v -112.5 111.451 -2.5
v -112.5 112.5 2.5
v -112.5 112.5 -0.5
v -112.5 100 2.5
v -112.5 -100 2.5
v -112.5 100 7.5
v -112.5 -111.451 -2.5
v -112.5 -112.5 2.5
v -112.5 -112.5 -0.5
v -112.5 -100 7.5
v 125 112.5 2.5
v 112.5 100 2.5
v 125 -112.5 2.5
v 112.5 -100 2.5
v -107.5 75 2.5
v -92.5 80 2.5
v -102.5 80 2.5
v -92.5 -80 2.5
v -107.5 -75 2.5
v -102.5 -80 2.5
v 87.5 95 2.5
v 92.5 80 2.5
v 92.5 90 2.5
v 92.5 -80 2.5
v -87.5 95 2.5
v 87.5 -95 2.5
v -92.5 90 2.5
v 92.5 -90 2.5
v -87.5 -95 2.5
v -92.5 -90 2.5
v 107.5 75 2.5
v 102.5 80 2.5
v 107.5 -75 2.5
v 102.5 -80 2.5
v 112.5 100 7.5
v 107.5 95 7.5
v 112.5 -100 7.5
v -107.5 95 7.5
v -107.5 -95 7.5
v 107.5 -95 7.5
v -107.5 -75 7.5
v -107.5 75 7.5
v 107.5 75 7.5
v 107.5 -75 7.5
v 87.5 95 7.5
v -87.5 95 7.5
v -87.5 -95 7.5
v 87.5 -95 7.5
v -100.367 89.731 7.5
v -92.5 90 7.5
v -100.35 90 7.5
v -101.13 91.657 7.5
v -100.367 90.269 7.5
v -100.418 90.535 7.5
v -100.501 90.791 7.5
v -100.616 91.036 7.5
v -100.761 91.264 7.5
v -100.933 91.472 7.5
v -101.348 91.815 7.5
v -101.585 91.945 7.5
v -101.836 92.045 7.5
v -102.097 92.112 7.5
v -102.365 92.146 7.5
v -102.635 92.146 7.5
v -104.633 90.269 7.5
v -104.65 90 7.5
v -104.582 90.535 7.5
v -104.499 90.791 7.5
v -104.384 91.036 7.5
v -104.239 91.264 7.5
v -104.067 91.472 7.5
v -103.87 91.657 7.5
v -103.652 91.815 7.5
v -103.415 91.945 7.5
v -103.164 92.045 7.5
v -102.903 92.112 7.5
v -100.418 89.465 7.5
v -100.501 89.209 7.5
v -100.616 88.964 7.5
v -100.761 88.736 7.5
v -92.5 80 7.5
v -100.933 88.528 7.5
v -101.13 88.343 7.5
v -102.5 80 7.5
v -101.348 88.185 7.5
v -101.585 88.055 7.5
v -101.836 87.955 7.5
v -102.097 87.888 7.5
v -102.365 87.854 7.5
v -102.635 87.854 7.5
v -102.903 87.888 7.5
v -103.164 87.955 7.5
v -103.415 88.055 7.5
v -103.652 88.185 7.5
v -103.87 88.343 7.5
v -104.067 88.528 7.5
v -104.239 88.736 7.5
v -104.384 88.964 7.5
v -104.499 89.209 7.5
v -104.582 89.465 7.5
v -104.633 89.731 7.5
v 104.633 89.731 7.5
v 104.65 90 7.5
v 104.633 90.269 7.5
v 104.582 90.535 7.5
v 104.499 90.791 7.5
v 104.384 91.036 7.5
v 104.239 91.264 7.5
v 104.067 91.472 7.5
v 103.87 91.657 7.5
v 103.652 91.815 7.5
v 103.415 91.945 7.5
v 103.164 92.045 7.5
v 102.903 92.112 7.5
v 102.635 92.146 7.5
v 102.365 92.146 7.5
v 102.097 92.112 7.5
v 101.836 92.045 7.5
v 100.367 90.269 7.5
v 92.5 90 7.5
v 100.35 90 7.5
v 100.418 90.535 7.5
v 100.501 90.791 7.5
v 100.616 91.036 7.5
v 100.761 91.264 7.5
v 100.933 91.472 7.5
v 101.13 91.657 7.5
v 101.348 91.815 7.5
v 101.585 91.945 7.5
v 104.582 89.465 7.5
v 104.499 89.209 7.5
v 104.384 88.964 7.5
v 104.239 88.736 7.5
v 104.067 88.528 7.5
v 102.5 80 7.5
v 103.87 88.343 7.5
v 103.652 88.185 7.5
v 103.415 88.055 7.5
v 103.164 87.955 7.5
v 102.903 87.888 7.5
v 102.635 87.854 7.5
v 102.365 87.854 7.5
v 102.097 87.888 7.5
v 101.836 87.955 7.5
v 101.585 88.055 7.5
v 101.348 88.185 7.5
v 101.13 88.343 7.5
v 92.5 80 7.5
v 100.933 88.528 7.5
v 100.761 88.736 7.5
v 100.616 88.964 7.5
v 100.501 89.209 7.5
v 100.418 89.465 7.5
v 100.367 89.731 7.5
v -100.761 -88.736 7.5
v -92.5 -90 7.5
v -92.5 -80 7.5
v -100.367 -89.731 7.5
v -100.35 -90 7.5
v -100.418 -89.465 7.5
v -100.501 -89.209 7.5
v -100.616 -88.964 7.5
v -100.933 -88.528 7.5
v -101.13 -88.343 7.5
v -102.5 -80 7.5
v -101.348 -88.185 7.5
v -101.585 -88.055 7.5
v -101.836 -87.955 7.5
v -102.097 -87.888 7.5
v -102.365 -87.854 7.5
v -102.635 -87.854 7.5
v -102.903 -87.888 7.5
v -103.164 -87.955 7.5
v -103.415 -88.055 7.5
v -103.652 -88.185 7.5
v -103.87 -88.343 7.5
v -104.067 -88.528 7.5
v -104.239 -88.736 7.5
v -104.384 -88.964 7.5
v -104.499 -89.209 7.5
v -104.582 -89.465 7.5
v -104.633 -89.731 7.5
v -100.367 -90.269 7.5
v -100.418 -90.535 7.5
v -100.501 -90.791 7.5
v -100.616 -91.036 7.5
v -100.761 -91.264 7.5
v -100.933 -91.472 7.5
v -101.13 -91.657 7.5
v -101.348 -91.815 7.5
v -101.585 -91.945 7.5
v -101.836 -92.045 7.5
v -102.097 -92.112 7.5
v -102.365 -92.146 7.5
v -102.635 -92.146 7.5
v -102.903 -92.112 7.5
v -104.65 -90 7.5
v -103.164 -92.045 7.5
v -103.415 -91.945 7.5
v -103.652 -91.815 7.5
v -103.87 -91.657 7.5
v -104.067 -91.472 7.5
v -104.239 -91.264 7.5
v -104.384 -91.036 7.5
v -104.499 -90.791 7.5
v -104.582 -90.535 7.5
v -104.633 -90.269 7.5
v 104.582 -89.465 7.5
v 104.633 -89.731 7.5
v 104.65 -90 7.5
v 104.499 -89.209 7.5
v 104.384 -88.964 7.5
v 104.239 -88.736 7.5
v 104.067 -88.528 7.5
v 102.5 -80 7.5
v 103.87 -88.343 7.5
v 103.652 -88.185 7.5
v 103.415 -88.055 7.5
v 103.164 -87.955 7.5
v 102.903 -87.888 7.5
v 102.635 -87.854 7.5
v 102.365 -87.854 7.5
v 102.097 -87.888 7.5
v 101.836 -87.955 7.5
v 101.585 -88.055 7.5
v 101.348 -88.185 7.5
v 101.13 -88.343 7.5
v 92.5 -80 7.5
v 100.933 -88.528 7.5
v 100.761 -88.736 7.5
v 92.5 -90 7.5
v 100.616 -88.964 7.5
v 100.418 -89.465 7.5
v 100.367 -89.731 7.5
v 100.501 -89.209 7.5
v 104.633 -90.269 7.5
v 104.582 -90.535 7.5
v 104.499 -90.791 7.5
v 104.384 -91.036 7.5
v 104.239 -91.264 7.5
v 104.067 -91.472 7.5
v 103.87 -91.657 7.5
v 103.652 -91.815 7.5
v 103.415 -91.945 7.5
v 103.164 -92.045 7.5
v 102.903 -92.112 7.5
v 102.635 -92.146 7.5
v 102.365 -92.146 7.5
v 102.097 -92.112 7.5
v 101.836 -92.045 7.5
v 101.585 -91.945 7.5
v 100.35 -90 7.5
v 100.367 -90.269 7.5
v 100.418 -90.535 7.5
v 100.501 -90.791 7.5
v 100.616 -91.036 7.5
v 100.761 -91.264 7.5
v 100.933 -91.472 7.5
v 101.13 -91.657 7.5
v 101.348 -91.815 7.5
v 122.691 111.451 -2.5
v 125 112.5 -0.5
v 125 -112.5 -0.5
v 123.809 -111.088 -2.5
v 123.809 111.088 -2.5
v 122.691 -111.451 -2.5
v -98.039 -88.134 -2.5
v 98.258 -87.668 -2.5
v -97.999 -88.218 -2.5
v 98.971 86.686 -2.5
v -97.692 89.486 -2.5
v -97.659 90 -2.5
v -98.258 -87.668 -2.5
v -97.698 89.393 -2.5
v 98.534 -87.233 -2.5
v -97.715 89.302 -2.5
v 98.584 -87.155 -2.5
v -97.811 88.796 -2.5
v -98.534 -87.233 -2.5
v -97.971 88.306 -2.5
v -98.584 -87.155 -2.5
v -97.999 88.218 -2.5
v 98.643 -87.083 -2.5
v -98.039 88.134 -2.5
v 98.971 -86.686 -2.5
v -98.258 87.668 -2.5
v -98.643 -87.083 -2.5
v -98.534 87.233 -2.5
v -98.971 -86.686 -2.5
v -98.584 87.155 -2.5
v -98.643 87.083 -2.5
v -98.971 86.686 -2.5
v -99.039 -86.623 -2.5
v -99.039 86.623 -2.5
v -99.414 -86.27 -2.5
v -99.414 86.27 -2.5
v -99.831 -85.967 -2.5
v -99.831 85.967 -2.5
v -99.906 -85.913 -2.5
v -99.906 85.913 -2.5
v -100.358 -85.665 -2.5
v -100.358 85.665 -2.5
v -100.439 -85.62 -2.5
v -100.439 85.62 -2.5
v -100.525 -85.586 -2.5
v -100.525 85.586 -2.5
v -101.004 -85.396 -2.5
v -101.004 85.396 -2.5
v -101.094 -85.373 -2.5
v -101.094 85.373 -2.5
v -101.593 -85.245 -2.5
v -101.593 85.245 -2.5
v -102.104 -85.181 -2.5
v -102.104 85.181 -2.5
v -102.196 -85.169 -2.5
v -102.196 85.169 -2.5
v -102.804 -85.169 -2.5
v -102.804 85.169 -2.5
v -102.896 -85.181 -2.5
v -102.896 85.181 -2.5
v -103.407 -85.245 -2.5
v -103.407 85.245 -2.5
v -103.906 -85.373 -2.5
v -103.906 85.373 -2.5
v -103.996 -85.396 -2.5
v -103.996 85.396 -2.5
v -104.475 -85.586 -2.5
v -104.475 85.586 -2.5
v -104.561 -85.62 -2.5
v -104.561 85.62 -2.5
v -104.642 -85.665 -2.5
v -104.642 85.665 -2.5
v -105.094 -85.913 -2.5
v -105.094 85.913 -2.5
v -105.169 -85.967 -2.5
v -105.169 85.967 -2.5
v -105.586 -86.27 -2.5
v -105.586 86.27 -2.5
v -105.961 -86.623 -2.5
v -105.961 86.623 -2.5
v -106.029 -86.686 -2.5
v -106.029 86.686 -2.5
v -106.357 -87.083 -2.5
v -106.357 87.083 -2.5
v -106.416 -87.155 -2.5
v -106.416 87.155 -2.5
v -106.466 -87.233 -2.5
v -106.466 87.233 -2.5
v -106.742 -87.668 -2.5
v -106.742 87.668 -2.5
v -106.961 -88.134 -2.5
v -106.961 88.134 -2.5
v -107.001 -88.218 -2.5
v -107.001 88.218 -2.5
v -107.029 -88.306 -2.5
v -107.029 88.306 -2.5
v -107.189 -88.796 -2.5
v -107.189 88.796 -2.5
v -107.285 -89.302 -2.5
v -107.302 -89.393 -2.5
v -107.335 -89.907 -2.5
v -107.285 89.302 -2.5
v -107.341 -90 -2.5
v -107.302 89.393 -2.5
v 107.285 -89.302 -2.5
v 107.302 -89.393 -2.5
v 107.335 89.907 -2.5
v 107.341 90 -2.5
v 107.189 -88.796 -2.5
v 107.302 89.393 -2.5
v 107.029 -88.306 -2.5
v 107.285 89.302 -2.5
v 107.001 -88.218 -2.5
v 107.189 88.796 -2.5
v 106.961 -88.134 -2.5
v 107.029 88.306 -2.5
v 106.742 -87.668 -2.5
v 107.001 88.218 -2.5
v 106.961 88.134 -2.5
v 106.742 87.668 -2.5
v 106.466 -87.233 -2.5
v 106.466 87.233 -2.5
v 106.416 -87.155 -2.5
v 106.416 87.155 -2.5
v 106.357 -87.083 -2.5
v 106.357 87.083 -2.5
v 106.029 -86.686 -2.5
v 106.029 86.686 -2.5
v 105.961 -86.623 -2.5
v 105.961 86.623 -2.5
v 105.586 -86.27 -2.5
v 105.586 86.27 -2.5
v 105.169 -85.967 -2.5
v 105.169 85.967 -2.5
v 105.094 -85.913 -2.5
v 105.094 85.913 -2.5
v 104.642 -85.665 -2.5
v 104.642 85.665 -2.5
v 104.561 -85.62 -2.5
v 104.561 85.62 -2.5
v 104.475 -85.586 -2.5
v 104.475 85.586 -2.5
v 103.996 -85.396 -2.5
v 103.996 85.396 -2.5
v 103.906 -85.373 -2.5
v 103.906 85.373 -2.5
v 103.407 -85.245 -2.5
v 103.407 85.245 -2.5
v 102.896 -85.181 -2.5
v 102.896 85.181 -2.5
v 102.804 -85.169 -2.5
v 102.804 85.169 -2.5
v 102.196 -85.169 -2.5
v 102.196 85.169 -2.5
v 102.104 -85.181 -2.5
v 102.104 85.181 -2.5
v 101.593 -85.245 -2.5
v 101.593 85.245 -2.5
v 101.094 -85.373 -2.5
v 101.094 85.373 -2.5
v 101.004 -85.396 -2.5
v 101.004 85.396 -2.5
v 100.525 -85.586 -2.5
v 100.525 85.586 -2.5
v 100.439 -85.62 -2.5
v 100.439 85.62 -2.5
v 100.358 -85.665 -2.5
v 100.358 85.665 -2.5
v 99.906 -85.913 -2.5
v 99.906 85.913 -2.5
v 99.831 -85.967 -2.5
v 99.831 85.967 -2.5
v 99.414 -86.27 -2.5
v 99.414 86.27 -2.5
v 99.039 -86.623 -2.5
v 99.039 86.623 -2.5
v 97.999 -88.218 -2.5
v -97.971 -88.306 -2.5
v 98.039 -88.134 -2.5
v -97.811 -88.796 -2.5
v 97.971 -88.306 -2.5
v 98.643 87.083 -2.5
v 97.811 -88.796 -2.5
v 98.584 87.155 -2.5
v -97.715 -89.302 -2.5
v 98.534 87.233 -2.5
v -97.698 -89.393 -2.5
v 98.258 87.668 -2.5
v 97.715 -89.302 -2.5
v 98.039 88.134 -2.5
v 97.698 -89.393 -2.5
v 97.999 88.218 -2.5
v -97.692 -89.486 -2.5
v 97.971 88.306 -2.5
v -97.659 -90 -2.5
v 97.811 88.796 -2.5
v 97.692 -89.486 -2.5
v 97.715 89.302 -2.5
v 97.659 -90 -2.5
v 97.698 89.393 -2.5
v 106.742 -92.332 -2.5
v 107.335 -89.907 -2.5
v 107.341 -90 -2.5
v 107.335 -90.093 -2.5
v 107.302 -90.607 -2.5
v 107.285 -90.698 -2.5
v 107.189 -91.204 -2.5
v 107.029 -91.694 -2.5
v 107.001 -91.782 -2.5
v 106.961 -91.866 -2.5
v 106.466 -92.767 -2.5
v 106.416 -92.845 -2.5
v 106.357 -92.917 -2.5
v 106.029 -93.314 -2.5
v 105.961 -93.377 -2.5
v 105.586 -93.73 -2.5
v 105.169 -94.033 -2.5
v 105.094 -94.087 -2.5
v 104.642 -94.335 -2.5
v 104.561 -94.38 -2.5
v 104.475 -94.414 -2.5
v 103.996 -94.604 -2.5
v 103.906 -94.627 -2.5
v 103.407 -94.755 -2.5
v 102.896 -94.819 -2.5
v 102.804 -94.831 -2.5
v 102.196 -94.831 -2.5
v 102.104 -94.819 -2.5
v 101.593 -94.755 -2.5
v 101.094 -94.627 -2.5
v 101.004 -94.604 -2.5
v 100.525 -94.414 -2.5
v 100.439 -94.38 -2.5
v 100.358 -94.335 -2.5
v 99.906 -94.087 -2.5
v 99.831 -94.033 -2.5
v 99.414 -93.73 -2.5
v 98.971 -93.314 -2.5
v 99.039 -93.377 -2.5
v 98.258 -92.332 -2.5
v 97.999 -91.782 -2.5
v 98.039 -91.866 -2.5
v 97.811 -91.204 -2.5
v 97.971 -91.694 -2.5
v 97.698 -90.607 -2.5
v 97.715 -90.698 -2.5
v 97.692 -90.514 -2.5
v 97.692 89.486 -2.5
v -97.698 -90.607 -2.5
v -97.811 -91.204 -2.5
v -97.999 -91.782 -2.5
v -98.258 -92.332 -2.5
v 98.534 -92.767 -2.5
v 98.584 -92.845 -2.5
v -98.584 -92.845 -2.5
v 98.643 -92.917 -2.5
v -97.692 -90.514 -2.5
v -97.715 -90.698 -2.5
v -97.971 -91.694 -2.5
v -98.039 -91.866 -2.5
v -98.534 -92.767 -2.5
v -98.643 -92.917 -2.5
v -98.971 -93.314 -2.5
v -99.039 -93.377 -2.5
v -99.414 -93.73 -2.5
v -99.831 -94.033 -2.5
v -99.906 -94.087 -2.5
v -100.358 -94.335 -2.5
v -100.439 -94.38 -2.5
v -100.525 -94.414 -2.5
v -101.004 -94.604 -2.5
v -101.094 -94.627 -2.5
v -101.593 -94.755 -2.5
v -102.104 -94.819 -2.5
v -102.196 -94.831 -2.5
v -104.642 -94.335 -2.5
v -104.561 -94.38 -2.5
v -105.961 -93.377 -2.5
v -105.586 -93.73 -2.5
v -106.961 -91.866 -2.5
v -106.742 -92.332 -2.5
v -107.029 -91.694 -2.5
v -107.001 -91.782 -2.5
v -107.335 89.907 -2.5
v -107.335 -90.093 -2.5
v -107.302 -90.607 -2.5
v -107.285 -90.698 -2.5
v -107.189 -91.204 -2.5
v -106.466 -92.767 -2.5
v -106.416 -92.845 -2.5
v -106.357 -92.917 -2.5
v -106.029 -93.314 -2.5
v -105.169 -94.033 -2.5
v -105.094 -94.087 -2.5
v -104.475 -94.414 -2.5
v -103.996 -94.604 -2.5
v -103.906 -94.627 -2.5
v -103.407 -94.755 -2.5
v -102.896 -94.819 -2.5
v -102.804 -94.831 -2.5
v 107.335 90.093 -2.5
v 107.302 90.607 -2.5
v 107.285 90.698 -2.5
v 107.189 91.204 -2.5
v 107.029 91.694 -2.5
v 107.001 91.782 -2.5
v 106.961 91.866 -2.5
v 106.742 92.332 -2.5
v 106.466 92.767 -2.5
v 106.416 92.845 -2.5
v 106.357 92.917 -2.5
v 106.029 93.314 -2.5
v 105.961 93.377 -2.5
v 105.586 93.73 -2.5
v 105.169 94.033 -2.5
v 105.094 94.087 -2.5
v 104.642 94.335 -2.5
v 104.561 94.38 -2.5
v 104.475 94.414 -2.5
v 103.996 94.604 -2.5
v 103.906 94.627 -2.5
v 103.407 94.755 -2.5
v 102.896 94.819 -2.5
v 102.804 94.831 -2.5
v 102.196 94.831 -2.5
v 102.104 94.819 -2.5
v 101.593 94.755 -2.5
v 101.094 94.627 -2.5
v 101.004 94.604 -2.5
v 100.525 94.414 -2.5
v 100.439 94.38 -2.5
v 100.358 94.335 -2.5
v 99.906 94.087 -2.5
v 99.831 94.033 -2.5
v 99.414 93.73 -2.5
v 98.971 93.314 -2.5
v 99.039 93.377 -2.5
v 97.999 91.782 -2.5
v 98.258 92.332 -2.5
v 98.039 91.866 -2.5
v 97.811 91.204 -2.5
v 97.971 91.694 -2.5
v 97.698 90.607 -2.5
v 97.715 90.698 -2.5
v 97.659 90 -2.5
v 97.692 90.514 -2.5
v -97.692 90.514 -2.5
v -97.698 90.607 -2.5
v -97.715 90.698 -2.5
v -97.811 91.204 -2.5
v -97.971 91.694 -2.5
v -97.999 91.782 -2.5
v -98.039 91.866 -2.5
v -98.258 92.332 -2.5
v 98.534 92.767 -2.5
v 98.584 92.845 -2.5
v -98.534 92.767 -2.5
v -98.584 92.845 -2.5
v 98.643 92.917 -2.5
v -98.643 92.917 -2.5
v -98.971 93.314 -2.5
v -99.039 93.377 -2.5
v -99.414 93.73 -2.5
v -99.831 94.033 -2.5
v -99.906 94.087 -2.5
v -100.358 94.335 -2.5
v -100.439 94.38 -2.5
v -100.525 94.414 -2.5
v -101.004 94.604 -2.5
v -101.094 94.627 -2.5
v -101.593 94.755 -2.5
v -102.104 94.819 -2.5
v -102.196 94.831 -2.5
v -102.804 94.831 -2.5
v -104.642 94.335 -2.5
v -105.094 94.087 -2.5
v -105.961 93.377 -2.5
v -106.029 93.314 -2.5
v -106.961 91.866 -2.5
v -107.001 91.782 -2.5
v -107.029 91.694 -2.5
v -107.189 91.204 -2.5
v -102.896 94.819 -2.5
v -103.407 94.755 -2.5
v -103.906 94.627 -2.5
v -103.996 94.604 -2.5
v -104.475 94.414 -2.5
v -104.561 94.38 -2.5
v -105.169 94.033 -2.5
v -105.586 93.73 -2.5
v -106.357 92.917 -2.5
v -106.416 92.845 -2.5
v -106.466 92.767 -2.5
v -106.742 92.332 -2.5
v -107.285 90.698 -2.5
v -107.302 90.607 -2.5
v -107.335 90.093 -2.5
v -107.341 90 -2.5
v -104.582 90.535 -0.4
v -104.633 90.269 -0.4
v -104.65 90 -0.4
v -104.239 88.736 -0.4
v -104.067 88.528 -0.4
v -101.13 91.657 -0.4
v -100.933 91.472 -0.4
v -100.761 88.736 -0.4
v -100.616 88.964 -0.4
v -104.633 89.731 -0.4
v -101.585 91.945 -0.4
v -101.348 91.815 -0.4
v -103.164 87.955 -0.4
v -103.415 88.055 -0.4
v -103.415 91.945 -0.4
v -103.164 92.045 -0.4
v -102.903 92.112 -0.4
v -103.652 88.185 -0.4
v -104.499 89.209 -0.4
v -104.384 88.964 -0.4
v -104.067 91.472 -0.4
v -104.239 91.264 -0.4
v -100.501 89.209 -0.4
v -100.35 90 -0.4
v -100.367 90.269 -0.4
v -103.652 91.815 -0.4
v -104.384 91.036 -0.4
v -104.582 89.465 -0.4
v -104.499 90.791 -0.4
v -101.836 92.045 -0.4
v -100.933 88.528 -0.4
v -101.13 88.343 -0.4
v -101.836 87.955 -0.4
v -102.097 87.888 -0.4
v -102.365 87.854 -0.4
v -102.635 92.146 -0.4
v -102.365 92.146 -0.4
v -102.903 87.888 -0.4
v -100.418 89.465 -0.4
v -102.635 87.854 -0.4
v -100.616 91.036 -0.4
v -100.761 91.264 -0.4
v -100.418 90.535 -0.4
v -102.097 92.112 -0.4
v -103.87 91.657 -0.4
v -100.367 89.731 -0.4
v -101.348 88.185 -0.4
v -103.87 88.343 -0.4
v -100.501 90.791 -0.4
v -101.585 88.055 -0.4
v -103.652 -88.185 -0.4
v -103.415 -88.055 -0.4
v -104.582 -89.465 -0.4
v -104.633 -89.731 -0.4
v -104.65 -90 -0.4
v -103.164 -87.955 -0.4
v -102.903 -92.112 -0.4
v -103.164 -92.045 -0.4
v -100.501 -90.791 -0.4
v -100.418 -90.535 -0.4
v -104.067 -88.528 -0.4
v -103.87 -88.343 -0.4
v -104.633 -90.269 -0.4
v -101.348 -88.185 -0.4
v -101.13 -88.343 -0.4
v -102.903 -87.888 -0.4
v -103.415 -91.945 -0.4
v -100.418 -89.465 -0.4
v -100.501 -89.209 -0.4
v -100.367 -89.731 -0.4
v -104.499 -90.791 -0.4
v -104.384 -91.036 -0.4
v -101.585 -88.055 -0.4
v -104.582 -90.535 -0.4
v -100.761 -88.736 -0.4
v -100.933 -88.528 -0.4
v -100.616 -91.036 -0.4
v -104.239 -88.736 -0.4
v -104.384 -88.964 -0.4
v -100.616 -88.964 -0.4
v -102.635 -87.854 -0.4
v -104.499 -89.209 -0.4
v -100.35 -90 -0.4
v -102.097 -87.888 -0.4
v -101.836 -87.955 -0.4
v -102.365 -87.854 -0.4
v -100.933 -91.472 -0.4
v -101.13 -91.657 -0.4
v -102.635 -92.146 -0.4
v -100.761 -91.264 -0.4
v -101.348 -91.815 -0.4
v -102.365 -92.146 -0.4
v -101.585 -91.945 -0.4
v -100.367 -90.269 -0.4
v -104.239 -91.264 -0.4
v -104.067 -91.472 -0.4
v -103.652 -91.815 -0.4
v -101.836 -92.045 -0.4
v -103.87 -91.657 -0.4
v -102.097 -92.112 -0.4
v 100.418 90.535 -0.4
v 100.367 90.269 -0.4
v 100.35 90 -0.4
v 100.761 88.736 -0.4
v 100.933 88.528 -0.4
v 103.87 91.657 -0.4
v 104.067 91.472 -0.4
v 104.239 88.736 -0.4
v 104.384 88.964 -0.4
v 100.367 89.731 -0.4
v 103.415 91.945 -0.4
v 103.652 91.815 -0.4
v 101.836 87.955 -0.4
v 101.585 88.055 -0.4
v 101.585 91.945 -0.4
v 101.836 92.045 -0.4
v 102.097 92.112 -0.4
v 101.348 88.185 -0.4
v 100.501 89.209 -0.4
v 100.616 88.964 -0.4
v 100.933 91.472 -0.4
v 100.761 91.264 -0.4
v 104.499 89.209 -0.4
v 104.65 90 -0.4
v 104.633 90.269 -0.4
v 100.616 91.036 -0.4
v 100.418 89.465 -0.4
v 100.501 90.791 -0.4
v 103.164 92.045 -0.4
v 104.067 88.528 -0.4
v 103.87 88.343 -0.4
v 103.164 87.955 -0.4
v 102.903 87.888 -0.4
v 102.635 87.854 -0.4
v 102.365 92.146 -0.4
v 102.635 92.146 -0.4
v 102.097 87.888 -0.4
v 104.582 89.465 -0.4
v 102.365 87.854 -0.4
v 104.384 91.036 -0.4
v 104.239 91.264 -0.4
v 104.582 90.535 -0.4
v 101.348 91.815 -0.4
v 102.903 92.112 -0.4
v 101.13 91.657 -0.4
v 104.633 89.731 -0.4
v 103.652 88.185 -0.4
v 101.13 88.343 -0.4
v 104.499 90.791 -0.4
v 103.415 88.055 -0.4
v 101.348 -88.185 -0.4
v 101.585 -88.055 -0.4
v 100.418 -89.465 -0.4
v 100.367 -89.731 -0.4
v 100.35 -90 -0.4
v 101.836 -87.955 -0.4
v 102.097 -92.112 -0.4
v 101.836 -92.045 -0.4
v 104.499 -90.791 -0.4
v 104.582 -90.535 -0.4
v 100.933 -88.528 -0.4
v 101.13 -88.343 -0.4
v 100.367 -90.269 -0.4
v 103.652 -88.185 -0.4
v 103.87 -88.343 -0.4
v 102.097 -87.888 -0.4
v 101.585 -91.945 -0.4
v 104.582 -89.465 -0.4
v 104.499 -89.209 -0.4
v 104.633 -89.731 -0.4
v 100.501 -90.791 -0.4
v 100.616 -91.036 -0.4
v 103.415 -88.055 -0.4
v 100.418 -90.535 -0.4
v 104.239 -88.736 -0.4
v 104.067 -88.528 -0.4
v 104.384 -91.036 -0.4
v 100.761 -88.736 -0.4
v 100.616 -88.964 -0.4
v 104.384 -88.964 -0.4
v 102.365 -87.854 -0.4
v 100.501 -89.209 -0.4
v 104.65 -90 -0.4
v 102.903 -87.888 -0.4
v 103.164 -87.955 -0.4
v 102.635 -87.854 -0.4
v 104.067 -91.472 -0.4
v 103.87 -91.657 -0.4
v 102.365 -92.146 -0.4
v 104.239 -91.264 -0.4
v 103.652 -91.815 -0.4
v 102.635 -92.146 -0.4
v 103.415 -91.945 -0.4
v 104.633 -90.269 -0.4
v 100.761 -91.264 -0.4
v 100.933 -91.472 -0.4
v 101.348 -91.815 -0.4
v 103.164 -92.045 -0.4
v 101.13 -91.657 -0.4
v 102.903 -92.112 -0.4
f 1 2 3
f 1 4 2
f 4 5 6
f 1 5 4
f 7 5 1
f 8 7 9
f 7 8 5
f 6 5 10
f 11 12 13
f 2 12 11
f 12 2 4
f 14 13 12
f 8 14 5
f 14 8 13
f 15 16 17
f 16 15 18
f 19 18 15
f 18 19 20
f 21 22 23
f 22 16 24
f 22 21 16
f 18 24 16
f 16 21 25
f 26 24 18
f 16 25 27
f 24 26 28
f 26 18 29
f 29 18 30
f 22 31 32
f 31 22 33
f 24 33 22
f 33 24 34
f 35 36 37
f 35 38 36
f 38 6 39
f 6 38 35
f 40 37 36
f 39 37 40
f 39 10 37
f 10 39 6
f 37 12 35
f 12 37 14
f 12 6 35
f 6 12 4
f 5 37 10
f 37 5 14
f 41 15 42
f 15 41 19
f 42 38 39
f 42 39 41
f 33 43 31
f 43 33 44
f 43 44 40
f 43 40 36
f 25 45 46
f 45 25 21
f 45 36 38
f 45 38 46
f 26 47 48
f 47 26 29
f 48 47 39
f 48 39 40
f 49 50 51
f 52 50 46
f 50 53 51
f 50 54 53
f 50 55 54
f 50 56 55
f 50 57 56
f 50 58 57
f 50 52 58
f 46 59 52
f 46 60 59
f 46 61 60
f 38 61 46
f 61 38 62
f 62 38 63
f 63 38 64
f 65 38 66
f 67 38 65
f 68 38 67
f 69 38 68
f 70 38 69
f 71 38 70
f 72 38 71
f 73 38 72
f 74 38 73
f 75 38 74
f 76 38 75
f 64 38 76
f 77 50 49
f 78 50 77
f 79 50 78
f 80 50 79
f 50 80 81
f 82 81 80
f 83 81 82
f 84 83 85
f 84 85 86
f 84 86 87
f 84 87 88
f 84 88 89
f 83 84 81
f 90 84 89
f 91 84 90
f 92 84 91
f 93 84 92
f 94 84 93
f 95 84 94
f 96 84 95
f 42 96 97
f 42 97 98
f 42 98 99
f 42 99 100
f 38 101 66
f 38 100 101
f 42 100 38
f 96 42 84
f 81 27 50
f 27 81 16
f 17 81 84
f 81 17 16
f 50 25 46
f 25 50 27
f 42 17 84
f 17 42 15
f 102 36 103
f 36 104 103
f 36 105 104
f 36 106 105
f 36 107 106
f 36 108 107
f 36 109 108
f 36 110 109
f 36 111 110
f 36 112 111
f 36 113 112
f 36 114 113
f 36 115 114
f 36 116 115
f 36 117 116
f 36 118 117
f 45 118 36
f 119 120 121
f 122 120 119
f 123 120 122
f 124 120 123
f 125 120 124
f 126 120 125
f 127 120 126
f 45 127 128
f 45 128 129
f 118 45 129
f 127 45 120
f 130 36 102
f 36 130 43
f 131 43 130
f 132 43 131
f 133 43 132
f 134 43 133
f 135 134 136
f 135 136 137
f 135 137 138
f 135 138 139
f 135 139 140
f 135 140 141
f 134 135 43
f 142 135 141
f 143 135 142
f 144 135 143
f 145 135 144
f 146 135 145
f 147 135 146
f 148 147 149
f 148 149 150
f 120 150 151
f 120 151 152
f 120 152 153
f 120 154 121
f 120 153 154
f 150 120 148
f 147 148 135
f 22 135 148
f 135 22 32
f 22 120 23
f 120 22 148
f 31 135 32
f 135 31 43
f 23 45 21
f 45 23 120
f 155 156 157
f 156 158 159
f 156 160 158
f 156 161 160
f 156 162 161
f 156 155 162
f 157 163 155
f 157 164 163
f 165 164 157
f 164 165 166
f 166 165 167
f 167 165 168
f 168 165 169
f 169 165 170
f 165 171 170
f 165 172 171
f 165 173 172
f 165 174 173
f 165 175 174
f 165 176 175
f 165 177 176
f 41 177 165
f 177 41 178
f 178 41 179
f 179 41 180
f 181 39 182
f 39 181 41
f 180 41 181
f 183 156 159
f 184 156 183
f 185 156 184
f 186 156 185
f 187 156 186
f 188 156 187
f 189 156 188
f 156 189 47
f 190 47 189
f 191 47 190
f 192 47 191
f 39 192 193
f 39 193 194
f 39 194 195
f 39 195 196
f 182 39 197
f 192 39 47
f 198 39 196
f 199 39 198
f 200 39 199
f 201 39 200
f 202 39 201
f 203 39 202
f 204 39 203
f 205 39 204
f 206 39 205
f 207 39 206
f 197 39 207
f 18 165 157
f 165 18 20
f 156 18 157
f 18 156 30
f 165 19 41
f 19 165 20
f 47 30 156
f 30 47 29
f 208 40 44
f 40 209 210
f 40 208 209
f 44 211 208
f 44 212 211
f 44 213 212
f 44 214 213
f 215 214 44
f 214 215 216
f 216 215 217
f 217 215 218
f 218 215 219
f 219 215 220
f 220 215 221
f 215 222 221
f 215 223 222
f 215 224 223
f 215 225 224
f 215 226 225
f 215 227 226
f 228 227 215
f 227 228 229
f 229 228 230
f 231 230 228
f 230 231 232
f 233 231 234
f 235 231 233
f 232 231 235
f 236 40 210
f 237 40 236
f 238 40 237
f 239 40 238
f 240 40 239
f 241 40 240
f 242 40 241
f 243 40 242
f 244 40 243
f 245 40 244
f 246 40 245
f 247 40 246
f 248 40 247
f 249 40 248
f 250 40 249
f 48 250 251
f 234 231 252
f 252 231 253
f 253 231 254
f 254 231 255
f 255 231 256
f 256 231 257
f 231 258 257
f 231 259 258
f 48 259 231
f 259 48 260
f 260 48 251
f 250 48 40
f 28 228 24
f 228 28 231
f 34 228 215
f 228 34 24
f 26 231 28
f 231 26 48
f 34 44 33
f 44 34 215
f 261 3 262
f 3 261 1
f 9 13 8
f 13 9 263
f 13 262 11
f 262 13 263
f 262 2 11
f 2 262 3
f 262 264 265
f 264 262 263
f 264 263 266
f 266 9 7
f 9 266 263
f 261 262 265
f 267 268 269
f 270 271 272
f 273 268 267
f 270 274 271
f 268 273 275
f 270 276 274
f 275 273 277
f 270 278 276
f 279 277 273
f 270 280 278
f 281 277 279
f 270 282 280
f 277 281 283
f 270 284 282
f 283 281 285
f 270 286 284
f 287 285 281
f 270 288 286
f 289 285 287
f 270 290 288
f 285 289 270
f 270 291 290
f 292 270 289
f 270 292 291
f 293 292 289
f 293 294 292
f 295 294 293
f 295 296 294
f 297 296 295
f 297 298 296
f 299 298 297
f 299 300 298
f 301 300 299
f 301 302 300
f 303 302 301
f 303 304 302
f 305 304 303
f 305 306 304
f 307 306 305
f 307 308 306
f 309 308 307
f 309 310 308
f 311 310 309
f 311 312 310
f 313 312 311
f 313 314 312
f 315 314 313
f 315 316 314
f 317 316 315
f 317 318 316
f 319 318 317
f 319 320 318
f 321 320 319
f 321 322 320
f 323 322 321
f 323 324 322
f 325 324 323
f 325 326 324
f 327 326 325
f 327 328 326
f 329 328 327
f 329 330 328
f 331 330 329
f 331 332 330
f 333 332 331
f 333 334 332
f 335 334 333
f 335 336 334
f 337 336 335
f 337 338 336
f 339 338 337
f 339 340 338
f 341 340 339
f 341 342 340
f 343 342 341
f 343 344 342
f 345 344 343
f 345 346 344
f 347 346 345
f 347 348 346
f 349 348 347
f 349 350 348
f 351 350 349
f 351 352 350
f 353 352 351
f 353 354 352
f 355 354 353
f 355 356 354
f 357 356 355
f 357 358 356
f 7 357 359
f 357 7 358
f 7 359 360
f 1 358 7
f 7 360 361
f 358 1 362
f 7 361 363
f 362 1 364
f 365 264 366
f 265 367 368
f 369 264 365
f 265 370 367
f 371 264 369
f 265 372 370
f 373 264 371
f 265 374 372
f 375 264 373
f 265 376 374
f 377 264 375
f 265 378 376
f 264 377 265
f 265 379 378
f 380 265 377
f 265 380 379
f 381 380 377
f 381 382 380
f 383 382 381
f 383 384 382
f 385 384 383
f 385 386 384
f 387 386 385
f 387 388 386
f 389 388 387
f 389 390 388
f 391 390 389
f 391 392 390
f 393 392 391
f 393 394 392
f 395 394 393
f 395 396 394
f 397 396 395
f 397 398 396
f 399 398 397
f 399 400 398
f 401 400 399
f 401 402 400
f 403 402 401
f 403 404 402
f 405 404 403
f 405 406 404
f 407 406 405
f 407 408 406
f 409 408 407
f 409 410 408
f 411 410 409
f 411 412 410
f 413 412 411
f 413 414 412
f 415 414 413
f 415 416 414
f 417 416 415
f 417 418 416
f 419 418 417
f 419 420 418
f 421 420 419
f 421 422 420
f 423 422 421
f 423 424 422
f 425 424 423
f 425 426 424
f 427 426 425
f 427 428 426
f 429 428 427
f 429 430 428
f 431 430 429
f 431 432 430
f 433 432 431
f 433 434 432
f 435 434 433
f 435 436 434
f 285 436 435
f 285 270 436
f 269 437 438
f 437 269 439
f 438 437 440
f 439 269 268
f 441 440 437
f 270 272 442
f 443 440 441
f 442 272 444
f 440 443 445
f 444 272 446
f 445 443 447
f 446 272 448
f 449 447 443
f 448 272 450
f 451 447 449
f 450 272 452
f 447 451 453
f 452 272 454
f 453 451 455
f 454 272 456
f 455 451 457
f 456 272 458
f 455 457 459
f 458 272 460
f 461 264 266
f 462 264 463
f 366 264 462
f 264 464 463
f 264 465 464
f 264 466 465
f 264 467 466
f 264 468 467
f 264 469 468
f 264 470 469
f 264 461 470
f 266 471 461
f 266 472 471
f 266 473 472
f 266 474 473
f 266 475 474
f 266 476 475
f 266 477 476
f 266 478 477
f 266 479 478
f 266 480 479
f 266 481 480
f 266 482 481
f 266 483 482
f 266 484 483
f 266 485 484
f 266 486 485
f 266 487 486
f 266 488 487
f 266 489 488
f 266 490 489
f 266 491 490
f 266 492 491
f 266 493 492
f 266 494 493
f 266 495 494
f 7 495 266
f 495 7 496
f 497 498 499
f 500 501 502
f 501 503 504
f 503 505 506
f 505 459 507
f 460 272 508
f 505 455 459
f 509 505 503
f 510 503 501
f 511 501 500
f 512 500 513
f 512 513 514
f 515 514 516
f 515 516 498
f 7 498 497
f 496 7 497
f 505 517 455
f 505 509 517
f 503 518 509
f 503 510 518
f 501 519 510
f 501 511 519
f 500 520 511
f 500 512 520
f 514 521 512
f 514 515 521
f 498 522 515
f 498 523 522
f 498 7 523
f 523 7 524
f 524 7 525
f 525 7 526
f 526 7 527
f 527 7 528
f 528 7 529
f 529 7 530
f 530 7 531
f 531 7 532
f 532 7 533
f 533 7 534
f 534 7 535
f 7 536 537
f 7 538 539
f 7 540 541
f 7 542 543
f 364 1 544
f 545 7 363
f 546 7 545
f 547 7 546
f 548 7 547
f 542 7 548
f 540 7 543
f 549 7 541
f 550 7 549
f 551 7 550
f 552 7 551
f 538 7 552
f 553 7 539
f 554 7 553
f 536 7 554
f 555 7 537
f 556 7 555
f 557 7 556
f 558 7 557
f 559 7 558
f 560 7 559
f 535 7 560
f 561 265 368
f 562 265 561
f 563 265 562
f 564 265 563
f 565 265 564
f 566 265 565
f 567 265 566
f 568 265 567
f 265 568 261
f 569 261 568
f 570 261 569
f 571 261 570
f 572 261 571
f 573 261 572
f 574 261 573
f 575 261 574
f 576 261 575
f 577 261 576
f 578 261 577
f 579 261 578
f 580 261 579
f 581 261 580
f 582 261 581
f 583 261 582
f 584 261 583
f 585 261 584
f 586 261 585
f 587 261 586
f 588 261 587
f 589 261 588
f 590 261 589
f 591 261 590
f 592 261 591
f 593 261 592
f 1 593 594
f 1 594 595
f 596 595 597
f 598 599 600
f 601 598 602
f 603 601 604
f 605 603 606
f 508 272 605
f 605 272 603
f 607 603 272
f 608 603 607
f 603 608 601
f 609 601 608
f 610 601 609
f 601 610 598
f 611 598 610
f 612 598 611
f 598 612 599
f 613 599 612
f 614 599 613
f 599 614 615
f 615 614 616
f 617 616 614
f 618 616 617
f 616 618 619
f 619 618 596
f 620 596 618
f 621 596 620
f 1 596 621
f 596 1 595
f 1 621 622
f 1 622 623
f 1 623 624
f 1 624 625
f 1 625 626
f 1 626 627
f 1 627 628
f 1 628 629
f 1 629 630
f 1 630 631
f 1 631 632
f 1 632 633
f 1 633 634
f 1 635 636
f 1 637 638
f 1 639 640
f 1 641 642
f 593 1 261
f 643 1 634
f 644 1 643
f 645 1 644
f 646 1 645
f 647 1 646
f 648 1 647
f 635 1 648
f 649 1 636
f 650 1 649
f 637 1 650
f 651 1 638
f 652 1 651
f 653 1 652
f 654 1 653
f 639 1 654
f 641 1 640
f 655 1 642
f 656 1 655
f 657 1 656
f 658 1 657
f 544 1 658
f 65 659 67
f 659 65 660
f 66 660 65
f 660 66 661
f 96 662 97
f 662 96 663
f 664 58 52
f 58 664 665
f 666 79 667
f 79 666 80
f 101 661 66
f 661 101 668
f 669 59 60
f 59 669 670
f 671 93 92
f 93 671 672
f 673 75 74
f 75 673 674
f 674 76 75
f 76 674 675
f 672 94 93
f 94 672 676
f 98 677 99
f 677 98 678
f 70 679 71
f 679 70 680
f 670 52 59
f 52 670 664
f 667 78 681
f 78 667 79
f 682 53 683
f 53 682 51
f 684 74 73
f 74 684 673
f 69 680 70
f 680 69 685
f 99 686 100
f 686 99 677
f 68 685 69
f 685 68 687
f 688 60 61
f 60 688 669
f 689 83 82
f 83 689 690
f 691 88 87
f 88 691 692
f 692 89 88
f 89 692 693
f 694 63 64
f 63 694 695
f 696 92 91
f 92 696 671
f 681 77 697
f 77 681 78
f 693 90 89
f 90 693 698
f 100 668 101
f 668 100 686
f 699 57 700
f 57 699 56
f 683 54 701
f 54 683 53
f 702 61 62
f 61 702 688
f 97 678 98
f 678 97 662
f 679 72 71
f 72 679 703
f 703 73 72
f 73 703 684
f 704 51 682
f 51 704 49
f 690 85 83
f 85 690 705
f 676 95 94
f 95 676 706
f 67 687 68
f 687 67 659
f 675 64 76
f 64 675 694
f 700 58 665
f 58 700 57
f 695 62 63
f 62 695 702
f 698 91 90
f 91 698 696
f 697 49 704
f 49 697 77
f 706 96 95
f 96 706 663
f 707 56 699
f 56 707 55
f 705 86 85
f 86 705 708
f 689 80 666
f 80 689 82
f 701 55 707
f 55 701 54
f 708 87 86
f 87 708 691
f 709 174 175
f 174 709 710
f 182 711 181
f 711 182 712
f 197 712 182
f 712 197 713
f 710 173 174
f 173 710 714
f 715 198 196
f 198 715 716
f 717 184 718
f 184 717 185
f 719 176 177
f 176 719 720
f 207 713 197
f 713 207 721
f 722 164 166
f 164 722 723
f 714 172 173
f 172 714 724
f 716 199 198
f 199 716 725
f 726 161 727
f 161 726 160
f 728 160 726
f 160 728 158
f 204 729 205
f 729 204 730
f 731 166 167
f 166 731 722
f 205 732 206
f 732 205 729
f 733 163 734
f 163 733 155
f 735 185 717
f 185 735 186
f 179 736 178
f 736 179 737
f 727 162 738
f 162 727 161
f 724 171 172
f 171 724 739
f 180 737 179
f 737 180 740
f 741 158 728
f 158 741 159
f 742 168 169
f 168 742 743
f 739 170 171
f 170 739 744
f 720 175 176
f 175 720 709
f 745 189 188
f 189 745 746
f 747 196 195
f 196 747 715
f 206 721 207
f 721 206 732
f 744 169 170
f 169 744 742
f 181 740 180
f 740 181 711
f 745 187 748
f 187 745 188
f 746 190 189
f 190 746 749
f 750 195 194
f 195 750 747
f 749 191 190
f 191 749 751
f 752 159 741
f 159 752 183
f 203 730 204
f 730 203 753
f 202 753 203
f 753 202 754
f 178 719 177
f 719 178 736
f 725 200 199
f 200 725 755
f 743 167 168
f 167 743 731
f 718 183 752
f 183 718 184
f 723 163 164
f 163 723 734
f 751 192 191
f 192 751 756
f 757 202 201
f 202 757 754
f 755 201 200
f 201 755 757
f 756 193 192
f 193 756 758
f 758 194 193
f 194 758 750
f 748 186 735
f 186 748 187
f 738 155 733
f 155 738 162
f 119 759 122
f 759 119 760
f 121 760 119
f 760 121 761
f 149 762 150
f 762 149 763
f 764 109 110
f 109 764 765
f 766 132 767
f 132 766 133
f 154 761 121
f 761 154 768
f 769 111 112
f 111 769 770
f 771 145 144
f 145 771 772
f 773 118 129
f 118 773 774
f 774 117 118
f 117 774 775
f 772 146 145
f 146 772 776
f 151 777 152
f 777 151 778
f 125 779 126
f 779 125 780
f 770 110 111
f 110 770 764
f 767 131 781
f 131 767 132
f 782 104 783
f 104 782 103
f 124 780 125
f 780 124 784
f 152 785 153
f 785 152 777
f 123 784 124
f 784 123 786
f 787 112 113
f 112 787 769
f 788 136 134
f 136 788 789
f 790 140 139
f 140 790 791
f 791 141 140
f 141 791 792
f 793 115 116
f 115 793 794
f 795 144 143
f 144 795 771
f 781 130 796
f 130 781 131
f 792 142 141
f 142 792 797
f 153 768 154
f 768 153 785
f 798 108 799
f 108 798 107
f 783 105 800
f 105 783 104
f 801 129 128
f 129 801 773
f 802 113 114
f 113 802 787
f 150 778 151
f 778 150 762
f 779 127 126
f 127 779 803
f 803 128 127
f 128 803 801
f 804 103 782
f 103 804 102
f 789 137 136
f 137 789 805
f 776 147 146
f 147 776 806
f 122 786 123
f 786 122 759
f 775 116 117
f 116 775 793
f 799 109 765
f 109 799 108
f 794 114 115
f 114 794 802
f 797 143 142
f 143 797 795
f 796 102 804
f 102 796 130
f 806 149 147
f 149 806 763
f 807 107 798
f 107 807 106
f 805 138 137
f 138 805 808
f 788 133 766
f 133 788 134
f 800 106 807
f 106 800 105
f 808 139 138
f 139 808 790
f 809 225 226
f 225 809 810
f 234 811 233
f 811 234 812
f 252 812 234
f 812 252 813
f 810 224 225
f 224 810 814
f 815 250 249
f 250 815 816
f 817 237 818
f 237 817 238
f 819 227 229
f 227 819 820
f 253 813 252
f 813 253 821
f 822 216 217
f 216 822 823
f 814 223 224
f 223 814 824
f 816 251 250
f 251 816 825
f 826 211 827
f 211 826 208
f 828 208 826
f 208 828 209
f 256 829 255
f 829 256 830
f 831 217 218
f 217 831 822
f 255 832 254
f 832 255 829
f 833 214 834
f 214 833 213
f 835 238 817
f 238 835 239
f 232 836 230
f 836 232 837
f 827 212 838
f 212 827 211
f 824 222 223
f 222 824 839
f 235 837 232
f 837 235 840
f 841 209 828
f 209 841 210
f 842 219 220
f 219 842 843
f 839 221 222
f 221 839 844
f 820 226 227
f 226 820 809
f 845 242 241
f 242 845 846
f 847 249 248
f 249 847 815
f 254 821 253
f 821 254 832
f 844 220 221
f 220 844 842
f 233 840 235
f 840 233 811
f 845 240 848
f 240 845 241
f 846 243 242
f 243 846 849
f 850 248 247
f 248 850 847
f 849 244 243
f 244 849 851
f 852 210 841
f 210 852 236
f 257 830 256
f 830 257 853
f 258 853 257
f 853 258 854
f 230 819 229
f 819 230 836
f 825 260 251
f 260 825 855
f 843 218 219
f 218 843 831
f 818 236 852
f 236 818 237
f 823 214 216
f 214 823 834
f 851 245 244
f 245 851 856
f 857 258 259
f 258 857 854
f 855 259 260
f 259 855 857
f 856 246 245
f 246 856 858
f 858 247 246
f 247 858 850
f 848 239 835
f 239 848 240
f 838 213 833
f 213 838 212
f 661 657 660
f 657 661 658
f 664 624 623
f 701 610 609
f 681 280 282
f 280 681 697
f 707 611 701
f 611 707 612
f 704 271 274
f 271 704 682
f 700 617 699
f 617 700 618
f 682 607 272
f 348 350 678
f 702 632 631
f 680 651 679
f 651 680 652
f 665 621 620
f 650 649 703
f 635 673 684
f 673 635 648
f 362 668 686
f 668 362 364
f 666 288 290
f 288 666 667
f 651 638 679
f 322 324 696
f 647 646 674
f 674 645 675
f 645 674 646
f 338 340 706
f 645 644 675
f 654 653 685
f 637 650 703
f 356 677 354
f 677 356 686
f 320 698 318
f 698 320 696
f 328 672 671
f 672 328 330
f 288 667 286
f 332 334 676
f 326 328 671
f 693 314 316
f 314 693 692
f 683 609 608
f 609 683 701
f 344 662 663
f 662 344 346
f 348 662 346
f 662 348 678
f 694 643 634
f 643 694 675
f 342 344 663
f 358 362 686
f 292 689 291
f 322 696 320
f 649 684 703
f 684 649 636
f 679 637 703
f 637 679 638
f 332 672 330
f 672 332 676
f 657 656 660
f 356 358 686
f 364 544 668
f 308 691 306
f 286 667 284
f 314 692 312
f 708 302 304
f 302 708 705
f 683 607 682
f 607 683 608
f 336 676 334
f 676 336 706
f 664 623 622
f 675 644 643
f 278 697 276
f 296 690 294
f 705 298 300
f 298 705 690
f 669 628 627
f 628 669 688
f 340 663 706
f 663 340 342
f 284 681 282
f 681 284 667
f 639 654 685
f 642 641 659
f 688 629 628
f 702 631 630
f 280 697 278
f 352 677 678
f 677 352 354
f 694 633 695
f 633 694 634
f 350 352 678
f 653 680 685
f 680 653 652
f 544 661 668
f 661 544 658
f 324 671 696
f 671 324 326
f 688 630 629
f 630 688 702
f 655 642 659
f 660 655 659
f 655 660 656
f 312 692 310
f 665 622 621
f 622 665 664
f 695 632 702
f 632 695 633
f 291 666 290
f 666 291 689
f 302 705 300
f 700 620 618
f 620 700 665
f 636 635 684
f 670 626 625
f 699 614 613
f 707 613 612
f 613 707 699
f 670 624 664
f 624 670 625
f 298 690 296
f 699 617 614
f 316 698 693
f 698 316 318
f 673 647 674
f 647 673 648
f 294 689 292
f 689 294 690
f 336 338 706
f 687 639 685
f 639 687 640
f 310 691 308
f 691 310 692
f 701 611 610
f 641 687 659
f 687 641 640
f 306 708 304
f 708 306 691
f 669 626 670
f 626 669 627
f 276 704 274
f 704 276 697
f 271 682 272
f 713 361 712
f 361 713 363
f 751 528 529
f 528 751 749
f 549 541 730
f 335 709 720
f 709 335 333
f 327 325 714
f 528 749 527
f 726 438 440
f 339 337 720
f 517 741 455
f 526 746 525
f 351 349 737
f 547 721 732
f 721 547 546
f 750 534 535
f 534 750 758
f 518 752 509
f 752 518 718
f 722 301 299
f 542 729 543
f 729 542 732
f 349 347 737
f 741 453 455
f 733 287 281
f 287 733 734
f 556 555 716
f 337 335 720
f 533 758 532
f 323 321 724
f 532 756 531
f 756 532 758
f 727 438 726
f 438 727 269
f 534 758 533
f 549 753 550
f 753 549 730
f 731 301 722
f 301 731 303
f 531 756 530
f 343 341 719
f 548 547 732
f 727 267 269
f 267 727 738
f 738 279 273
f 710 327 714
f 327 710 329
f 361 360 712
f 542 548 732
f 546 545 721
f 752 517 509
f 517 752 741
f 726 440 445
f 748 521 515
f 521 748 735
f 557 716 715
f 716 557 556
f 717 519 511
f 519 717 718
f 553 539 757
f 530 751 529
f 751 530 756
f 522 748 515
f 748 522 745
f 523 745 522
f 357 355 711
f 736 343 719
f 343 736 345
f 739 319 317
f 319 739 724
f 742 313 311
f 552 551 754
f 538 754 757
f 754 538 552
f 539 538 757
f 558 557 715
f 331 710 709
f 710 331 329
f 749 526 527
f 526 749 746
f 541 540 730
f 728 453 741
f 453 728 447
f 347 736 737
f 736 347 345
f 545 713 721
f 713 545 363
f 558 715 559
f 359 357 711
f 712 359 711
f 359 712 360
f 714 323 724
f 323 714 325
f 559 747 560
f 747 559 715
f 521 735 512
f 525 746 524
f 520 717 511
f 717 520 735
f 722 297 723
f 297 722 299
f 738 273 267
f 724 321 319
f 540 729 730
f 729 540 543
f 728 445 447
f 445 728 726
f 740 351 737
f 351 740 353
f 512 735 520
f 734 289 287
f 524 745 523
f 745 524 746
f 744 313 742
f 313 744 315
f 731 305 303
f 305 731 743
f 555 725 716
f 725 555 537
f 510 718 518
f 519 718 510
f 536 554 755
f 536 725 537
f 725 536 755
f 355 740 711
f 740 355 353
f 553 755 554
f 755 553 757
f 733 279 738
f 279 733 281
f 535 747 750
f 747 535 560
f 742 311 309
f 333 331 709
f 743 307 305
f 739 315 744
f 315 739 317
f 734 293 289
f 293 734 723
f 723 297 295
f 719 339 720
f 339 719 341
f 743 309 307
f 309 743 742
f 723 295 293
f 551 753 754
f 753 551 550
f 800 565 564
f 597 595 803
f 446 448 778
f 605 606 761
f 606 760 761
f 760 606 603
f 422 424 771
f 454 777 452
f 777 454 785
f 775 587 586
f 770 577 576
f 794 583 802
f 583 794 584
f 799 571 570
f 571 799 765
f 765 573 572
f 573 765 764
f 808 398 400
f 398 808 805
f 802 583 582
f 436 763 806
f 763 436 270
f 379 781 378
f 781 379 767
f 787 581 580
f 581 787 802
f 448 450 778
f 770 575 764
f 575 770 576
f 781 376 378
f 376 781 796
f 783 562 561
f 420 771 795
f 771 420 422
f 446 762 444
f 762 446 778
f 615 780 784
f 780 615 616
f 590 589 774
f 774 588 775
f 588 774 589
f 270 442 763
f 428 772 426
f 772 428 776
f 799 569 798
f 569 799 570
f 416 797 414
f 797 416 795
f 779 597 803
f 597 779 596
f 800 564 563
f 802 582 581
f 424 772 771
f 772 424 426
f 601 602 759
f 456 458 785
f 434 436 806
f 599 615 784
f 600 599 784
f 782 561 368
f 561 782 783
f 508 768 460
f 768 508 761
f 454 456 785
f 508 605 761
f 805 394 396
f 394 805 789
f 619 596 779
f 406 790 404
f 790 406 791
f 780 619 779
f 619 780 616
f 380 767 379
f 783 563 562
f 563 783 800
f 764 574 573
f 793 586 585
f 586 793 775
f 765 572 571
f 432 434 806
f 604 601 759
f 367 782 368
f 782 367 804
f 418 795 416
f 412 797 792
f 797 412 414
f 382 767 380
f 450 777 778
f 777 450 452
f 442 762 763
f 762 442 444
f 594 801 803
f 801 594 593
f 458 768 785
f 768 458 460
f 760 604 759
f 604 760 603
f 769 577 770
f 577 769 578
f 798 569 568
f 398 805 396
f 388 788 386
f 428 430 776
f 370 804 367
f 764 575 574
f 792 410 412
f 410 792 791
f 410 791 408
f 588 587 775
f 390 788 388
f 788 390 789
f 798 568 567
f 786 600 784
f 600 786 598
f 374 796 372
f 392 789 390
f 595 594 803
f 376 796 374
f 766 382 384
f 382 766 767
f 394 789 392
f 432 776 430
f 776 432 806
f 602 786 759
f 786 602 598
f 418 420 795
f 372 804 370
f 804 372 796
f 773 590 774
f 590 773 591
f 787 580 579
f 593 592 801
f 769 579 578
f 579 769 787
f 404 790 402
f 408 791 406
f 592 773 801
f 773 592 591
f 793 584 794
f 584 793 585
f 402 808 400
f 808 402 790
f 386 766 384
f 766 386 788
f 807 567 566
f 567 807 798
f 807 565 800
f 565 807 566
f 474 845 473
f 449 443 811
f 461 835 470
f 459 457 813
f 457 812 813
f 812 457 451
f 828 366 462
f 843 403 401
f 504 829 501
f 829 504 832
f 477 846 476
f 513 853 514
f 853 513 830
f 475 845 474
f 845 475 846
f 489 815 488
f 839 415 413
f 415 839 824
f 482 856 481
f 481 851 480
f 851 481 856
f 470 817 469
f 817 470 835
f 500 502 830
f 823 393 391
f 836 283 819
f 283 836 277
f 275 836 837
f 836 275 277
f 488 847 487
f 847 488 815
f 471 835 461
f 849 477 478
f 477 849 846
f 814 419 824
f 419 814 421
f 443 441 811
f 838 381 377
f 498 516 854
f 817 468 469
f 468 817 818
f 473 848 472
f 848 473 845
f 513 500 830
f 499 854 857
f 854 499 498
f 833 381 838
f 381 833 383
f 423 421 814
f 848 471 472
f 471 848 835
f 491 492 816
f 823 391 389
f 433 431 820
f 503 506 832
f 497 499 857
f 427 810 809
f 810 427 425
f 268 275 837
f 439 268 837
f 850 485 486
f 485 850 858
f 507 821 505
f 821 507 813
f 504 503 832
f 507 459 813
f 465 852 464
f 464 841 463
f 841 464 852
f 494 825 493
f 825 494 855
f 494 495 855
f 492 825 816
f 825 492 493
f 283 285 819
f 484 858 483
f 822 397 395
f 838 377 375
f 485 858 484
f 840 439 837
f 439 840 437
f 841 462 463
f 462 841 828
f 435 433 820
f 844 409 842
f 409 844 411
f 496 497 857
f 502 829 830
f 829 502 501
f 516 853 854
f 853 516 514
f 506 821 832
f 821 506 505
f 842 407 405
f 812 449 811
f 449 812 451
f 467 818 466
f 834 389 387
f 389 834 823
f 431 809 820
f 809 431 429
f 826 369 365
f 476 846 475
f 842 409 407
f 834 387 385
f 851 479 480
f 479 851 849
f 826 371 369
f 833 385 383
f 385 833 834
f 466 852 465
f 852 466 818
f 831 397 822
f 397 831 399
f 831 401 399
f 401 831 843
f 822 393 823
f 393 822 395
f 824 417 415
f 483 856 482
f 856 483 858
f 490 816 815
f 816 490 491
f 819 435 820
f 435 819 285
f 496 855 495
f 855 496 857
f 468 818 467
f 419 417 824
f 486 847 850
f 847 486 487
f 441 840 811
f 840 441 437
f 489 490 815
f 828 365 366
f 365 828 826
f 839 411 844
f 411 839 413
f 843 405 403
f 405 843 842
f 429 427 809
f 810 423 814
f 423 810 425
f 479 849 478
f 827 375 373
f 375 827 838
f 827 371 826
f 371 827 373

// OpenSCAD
// file: bottom-panel-overhang-solo.scad
/*
 * SPDX-FileCopyrightText: © 2023 Brian S. Stephan <bss@incorporeal.org>
 * SPDX-License-Identifier: GPL-3.0-or-later
 */

include <parameters.scad>
include <components.scad>

module bottom_panel_solo() {
	difference() {
		rotate([180, 0, 0]) base_panel_with_raised_overhang();
		rotate([180, 0, 0]) panel_holes();
	}
}

bottom_panel_solo();
// file: bottom-panel-overhang-left.scad
/*
 * SPDX-FileCopyrightText: © 2023 Brian S. Stephan <bss@incorporeal.org>
 * SPDX-License-Identifier: GPL-3.0-or-later
 */

include <parameters.scad>
include <components.scad>
use <bottom-panel-overhang-solo.scad>

module bottom_panel_left() {
	difference() {
		bottom_panel_solo();
		// chop the right edge off
		side_chopper();
	}
}

bottom_panel_left();
// file: parameters.scad
/*
 * SPDX-FileCopyrightText: © 2023 Brian S. Stephan <bss@incorporeal.org>
 * SPDX-License-Identifier: GPL-3.0-or-later
 */


// CONNECTION POINT SIZES


// adjustments
hole_tolerance = 0.15;

// M2
m2_screw_selftap_radius = 0.95;

// M3
m3_screw_selftap_radius = 1.3;

// M4
m4_bolt_radius = 2 + hole_tolerance;
m4_bolt_countersink_radius = 6.1 + hole_tolerance;
m4_bolt_hex_exterior_radius = 3.6 + hole_tolerance;

// M6
m6_bolt_radius = 3 + hole_tolerance;

// 24mm button
small_button_radius = 12 + hole_tolerance;

// 30mm button
big_button_radius = 15 + hole_tolerance;

// carve out space around buttons for screw-in nuts
// slagcoin has screw-in nut diameter at 36mm for 30mm buttons, 29.5 for 24mm buttons
// radius + value below should leave space for the nut and for fingers to grab the nut
button_radius_connector_space = 5;

// standard lever hole
lever_plate_hole = 12;

// neutrik D screw holes
neutrik_d_screw_radius = 1.6 + hole_tolerance;
neutrik_d_radius = 12 + hole_tolerance;


// ELEMENT DIMENSIONS


// JLF mount dimensions
lever_mount_x = 53;
lever_mount_y = 95;
lever_mount_z = 2;

// base frame box. reminder: inside top and bottom (including mounts) are chopped by panel_z for plates
frame_x = 233;
frame_y = 208;
frame_z = 57;

// depth of the "lip" of the frame that the top plate sets into/supports the overhang
frame_wall = 4;

// top plate, which can either be the whole plate ("inset") or the mounting frame for a plate that overhangs
panel_x = frame_x - (frame_wall * 2);
panel_y = frame_y - (frame_wall * 2);
panel_z = 5;

// some dimensions for frame pieces, useful in doing some intersections and chopping
frame_piece_x_x = frame_x - (frame_wall * 2);	// essentially panel_x, yes
frame_piece_y_y = frame_y;			// the whole y of the frame, yes

// degree to which the extended frame pieces stick out from the end of the frame
frame_extension_x = 25;
frame_extension_y = 25;

// this sinks the bottom and top of the frame inward a bit, and is used to math out two shapes
// when creating the frame box / overhang panel
frame_bevel_height = 1.25;
overhang_panel_bevel_height = 1;

frame_center_to_neutrik = 70;

// width of the column in the frame corners to support the hex bolt
frame_mount_column_width = 20;

// per neutrik (mm)
neutrik_panel_thickness = 3;

// inside the frame
inner_frame_z = frame_z - (panel_z * 2);

// "windowed" pieces chop out the inner wall of the frame as a separate piece in order
// to print it a different color/way/style. to improve friction fit, it is only the below
// value scale of the whole wall, so that the rest of the wall is retained on the outer
// piece, which helps clamp the two together (and helps the panels clamp it all)
inner_frame_z_decorative_scale = 0.95;

// how much the top plate x/y is expanded to overhang the frame
// note that this is relative to the top plate (so the wall is added back)
panel_overhang_amount = 8.5;
overhang_panel_x = panel_x + (frame_wall * 2) + (panel_overhang_amount * 2);
overhang_panel_y = panel_y + (frame_wall * 2) + (panel_overhang_amount * 2);

panel_to_frame_point_offset = 10;
panel_to_frame_point_x = (panel_x/2) - panel_to_frame_point_offset;
panel_to_frame_point_y = (panel_y/2) - panel_to_frame_point_offset;

// frame interior that supports the top plates
panel_support_width = 5;

// additional button radius for decorative panels, etc.
decorative_radius_scale = 1.75;
jumbo_decorative_radius_scale = 2;

// decorative wall cutout parameters
// thicker than the actual base wall to account for the longish pieces
wall_cutout_depth = frame_wall * 3;

// decorative slash parameters
slash_inner_displacement = 10;
slash_width = 15;
slash_height = frame_z-panel_z*3;

// dustwasher parameters
jlf_dustwasher_radius = 19;
jlf_shaft_inner_radius = 4.55;

lsx_nobi_dustwasher_radius = jlf_dustwasher_radius;
lsx_nobi_shaft_inner_radius = 5;

shaft_position_tolerance = 2;

// stand dimensions to display a stick
stand_x = 5;
stand_y = frame_z;
stand_z = 15;

// oled cutout stuff
ssd1306_x = 23;
ssd1306_y = 12;
ssd1306_z = 1;
adafruit_pid_326_oled_ssd1306_cutout_x = 30;
adafruit_pid_326_oled_ssd1306_cutout_y = 32;


// LAYOUTS


sega_2p_column_2_offset = 30.5;
sega_2p_column_3_offset = sega_2p_column_2_offset + 36;
sega_2p_column_4_offset = sega_2p_column_3_offset + 36;
sega_2p_column_5_offset = sega_2p_column_4_offset + 36;

// this offset is from the left edge of the panel
sega_2p_column_1_left_panel_edge_offset = 28.06;

dir_arc_30mm_column_2_offset = 33.8;
dir_arc_30mm_column_3_offset = dir_arc_30mm_column_2_offset + 34.8;
dir_arc_30mm_row_2_offset = 57.2;
dir_arc_30mm_row_3_offset = dir_arc_30mm_row_2_offset + 12.9;
dir_arc_w_30mm_row_4_offset = dir_arc_30mm_row_3_offset + 34.5;
// main file
/*
 * SPDX-FileCopyrightText: © 2023 Brian S. Stephan <bss@incorporeal.org>
 * SPDX-License-Identifier: GPL-3.0-or-later
 */

include <parameters.scad>
include <components.scad>
use <bottom-panel-overhang-left.scad>

module bottom_panel_right() {
	rotate([0, 0, 180]) bottom_panel_left();
}

bottom_panel_right();
